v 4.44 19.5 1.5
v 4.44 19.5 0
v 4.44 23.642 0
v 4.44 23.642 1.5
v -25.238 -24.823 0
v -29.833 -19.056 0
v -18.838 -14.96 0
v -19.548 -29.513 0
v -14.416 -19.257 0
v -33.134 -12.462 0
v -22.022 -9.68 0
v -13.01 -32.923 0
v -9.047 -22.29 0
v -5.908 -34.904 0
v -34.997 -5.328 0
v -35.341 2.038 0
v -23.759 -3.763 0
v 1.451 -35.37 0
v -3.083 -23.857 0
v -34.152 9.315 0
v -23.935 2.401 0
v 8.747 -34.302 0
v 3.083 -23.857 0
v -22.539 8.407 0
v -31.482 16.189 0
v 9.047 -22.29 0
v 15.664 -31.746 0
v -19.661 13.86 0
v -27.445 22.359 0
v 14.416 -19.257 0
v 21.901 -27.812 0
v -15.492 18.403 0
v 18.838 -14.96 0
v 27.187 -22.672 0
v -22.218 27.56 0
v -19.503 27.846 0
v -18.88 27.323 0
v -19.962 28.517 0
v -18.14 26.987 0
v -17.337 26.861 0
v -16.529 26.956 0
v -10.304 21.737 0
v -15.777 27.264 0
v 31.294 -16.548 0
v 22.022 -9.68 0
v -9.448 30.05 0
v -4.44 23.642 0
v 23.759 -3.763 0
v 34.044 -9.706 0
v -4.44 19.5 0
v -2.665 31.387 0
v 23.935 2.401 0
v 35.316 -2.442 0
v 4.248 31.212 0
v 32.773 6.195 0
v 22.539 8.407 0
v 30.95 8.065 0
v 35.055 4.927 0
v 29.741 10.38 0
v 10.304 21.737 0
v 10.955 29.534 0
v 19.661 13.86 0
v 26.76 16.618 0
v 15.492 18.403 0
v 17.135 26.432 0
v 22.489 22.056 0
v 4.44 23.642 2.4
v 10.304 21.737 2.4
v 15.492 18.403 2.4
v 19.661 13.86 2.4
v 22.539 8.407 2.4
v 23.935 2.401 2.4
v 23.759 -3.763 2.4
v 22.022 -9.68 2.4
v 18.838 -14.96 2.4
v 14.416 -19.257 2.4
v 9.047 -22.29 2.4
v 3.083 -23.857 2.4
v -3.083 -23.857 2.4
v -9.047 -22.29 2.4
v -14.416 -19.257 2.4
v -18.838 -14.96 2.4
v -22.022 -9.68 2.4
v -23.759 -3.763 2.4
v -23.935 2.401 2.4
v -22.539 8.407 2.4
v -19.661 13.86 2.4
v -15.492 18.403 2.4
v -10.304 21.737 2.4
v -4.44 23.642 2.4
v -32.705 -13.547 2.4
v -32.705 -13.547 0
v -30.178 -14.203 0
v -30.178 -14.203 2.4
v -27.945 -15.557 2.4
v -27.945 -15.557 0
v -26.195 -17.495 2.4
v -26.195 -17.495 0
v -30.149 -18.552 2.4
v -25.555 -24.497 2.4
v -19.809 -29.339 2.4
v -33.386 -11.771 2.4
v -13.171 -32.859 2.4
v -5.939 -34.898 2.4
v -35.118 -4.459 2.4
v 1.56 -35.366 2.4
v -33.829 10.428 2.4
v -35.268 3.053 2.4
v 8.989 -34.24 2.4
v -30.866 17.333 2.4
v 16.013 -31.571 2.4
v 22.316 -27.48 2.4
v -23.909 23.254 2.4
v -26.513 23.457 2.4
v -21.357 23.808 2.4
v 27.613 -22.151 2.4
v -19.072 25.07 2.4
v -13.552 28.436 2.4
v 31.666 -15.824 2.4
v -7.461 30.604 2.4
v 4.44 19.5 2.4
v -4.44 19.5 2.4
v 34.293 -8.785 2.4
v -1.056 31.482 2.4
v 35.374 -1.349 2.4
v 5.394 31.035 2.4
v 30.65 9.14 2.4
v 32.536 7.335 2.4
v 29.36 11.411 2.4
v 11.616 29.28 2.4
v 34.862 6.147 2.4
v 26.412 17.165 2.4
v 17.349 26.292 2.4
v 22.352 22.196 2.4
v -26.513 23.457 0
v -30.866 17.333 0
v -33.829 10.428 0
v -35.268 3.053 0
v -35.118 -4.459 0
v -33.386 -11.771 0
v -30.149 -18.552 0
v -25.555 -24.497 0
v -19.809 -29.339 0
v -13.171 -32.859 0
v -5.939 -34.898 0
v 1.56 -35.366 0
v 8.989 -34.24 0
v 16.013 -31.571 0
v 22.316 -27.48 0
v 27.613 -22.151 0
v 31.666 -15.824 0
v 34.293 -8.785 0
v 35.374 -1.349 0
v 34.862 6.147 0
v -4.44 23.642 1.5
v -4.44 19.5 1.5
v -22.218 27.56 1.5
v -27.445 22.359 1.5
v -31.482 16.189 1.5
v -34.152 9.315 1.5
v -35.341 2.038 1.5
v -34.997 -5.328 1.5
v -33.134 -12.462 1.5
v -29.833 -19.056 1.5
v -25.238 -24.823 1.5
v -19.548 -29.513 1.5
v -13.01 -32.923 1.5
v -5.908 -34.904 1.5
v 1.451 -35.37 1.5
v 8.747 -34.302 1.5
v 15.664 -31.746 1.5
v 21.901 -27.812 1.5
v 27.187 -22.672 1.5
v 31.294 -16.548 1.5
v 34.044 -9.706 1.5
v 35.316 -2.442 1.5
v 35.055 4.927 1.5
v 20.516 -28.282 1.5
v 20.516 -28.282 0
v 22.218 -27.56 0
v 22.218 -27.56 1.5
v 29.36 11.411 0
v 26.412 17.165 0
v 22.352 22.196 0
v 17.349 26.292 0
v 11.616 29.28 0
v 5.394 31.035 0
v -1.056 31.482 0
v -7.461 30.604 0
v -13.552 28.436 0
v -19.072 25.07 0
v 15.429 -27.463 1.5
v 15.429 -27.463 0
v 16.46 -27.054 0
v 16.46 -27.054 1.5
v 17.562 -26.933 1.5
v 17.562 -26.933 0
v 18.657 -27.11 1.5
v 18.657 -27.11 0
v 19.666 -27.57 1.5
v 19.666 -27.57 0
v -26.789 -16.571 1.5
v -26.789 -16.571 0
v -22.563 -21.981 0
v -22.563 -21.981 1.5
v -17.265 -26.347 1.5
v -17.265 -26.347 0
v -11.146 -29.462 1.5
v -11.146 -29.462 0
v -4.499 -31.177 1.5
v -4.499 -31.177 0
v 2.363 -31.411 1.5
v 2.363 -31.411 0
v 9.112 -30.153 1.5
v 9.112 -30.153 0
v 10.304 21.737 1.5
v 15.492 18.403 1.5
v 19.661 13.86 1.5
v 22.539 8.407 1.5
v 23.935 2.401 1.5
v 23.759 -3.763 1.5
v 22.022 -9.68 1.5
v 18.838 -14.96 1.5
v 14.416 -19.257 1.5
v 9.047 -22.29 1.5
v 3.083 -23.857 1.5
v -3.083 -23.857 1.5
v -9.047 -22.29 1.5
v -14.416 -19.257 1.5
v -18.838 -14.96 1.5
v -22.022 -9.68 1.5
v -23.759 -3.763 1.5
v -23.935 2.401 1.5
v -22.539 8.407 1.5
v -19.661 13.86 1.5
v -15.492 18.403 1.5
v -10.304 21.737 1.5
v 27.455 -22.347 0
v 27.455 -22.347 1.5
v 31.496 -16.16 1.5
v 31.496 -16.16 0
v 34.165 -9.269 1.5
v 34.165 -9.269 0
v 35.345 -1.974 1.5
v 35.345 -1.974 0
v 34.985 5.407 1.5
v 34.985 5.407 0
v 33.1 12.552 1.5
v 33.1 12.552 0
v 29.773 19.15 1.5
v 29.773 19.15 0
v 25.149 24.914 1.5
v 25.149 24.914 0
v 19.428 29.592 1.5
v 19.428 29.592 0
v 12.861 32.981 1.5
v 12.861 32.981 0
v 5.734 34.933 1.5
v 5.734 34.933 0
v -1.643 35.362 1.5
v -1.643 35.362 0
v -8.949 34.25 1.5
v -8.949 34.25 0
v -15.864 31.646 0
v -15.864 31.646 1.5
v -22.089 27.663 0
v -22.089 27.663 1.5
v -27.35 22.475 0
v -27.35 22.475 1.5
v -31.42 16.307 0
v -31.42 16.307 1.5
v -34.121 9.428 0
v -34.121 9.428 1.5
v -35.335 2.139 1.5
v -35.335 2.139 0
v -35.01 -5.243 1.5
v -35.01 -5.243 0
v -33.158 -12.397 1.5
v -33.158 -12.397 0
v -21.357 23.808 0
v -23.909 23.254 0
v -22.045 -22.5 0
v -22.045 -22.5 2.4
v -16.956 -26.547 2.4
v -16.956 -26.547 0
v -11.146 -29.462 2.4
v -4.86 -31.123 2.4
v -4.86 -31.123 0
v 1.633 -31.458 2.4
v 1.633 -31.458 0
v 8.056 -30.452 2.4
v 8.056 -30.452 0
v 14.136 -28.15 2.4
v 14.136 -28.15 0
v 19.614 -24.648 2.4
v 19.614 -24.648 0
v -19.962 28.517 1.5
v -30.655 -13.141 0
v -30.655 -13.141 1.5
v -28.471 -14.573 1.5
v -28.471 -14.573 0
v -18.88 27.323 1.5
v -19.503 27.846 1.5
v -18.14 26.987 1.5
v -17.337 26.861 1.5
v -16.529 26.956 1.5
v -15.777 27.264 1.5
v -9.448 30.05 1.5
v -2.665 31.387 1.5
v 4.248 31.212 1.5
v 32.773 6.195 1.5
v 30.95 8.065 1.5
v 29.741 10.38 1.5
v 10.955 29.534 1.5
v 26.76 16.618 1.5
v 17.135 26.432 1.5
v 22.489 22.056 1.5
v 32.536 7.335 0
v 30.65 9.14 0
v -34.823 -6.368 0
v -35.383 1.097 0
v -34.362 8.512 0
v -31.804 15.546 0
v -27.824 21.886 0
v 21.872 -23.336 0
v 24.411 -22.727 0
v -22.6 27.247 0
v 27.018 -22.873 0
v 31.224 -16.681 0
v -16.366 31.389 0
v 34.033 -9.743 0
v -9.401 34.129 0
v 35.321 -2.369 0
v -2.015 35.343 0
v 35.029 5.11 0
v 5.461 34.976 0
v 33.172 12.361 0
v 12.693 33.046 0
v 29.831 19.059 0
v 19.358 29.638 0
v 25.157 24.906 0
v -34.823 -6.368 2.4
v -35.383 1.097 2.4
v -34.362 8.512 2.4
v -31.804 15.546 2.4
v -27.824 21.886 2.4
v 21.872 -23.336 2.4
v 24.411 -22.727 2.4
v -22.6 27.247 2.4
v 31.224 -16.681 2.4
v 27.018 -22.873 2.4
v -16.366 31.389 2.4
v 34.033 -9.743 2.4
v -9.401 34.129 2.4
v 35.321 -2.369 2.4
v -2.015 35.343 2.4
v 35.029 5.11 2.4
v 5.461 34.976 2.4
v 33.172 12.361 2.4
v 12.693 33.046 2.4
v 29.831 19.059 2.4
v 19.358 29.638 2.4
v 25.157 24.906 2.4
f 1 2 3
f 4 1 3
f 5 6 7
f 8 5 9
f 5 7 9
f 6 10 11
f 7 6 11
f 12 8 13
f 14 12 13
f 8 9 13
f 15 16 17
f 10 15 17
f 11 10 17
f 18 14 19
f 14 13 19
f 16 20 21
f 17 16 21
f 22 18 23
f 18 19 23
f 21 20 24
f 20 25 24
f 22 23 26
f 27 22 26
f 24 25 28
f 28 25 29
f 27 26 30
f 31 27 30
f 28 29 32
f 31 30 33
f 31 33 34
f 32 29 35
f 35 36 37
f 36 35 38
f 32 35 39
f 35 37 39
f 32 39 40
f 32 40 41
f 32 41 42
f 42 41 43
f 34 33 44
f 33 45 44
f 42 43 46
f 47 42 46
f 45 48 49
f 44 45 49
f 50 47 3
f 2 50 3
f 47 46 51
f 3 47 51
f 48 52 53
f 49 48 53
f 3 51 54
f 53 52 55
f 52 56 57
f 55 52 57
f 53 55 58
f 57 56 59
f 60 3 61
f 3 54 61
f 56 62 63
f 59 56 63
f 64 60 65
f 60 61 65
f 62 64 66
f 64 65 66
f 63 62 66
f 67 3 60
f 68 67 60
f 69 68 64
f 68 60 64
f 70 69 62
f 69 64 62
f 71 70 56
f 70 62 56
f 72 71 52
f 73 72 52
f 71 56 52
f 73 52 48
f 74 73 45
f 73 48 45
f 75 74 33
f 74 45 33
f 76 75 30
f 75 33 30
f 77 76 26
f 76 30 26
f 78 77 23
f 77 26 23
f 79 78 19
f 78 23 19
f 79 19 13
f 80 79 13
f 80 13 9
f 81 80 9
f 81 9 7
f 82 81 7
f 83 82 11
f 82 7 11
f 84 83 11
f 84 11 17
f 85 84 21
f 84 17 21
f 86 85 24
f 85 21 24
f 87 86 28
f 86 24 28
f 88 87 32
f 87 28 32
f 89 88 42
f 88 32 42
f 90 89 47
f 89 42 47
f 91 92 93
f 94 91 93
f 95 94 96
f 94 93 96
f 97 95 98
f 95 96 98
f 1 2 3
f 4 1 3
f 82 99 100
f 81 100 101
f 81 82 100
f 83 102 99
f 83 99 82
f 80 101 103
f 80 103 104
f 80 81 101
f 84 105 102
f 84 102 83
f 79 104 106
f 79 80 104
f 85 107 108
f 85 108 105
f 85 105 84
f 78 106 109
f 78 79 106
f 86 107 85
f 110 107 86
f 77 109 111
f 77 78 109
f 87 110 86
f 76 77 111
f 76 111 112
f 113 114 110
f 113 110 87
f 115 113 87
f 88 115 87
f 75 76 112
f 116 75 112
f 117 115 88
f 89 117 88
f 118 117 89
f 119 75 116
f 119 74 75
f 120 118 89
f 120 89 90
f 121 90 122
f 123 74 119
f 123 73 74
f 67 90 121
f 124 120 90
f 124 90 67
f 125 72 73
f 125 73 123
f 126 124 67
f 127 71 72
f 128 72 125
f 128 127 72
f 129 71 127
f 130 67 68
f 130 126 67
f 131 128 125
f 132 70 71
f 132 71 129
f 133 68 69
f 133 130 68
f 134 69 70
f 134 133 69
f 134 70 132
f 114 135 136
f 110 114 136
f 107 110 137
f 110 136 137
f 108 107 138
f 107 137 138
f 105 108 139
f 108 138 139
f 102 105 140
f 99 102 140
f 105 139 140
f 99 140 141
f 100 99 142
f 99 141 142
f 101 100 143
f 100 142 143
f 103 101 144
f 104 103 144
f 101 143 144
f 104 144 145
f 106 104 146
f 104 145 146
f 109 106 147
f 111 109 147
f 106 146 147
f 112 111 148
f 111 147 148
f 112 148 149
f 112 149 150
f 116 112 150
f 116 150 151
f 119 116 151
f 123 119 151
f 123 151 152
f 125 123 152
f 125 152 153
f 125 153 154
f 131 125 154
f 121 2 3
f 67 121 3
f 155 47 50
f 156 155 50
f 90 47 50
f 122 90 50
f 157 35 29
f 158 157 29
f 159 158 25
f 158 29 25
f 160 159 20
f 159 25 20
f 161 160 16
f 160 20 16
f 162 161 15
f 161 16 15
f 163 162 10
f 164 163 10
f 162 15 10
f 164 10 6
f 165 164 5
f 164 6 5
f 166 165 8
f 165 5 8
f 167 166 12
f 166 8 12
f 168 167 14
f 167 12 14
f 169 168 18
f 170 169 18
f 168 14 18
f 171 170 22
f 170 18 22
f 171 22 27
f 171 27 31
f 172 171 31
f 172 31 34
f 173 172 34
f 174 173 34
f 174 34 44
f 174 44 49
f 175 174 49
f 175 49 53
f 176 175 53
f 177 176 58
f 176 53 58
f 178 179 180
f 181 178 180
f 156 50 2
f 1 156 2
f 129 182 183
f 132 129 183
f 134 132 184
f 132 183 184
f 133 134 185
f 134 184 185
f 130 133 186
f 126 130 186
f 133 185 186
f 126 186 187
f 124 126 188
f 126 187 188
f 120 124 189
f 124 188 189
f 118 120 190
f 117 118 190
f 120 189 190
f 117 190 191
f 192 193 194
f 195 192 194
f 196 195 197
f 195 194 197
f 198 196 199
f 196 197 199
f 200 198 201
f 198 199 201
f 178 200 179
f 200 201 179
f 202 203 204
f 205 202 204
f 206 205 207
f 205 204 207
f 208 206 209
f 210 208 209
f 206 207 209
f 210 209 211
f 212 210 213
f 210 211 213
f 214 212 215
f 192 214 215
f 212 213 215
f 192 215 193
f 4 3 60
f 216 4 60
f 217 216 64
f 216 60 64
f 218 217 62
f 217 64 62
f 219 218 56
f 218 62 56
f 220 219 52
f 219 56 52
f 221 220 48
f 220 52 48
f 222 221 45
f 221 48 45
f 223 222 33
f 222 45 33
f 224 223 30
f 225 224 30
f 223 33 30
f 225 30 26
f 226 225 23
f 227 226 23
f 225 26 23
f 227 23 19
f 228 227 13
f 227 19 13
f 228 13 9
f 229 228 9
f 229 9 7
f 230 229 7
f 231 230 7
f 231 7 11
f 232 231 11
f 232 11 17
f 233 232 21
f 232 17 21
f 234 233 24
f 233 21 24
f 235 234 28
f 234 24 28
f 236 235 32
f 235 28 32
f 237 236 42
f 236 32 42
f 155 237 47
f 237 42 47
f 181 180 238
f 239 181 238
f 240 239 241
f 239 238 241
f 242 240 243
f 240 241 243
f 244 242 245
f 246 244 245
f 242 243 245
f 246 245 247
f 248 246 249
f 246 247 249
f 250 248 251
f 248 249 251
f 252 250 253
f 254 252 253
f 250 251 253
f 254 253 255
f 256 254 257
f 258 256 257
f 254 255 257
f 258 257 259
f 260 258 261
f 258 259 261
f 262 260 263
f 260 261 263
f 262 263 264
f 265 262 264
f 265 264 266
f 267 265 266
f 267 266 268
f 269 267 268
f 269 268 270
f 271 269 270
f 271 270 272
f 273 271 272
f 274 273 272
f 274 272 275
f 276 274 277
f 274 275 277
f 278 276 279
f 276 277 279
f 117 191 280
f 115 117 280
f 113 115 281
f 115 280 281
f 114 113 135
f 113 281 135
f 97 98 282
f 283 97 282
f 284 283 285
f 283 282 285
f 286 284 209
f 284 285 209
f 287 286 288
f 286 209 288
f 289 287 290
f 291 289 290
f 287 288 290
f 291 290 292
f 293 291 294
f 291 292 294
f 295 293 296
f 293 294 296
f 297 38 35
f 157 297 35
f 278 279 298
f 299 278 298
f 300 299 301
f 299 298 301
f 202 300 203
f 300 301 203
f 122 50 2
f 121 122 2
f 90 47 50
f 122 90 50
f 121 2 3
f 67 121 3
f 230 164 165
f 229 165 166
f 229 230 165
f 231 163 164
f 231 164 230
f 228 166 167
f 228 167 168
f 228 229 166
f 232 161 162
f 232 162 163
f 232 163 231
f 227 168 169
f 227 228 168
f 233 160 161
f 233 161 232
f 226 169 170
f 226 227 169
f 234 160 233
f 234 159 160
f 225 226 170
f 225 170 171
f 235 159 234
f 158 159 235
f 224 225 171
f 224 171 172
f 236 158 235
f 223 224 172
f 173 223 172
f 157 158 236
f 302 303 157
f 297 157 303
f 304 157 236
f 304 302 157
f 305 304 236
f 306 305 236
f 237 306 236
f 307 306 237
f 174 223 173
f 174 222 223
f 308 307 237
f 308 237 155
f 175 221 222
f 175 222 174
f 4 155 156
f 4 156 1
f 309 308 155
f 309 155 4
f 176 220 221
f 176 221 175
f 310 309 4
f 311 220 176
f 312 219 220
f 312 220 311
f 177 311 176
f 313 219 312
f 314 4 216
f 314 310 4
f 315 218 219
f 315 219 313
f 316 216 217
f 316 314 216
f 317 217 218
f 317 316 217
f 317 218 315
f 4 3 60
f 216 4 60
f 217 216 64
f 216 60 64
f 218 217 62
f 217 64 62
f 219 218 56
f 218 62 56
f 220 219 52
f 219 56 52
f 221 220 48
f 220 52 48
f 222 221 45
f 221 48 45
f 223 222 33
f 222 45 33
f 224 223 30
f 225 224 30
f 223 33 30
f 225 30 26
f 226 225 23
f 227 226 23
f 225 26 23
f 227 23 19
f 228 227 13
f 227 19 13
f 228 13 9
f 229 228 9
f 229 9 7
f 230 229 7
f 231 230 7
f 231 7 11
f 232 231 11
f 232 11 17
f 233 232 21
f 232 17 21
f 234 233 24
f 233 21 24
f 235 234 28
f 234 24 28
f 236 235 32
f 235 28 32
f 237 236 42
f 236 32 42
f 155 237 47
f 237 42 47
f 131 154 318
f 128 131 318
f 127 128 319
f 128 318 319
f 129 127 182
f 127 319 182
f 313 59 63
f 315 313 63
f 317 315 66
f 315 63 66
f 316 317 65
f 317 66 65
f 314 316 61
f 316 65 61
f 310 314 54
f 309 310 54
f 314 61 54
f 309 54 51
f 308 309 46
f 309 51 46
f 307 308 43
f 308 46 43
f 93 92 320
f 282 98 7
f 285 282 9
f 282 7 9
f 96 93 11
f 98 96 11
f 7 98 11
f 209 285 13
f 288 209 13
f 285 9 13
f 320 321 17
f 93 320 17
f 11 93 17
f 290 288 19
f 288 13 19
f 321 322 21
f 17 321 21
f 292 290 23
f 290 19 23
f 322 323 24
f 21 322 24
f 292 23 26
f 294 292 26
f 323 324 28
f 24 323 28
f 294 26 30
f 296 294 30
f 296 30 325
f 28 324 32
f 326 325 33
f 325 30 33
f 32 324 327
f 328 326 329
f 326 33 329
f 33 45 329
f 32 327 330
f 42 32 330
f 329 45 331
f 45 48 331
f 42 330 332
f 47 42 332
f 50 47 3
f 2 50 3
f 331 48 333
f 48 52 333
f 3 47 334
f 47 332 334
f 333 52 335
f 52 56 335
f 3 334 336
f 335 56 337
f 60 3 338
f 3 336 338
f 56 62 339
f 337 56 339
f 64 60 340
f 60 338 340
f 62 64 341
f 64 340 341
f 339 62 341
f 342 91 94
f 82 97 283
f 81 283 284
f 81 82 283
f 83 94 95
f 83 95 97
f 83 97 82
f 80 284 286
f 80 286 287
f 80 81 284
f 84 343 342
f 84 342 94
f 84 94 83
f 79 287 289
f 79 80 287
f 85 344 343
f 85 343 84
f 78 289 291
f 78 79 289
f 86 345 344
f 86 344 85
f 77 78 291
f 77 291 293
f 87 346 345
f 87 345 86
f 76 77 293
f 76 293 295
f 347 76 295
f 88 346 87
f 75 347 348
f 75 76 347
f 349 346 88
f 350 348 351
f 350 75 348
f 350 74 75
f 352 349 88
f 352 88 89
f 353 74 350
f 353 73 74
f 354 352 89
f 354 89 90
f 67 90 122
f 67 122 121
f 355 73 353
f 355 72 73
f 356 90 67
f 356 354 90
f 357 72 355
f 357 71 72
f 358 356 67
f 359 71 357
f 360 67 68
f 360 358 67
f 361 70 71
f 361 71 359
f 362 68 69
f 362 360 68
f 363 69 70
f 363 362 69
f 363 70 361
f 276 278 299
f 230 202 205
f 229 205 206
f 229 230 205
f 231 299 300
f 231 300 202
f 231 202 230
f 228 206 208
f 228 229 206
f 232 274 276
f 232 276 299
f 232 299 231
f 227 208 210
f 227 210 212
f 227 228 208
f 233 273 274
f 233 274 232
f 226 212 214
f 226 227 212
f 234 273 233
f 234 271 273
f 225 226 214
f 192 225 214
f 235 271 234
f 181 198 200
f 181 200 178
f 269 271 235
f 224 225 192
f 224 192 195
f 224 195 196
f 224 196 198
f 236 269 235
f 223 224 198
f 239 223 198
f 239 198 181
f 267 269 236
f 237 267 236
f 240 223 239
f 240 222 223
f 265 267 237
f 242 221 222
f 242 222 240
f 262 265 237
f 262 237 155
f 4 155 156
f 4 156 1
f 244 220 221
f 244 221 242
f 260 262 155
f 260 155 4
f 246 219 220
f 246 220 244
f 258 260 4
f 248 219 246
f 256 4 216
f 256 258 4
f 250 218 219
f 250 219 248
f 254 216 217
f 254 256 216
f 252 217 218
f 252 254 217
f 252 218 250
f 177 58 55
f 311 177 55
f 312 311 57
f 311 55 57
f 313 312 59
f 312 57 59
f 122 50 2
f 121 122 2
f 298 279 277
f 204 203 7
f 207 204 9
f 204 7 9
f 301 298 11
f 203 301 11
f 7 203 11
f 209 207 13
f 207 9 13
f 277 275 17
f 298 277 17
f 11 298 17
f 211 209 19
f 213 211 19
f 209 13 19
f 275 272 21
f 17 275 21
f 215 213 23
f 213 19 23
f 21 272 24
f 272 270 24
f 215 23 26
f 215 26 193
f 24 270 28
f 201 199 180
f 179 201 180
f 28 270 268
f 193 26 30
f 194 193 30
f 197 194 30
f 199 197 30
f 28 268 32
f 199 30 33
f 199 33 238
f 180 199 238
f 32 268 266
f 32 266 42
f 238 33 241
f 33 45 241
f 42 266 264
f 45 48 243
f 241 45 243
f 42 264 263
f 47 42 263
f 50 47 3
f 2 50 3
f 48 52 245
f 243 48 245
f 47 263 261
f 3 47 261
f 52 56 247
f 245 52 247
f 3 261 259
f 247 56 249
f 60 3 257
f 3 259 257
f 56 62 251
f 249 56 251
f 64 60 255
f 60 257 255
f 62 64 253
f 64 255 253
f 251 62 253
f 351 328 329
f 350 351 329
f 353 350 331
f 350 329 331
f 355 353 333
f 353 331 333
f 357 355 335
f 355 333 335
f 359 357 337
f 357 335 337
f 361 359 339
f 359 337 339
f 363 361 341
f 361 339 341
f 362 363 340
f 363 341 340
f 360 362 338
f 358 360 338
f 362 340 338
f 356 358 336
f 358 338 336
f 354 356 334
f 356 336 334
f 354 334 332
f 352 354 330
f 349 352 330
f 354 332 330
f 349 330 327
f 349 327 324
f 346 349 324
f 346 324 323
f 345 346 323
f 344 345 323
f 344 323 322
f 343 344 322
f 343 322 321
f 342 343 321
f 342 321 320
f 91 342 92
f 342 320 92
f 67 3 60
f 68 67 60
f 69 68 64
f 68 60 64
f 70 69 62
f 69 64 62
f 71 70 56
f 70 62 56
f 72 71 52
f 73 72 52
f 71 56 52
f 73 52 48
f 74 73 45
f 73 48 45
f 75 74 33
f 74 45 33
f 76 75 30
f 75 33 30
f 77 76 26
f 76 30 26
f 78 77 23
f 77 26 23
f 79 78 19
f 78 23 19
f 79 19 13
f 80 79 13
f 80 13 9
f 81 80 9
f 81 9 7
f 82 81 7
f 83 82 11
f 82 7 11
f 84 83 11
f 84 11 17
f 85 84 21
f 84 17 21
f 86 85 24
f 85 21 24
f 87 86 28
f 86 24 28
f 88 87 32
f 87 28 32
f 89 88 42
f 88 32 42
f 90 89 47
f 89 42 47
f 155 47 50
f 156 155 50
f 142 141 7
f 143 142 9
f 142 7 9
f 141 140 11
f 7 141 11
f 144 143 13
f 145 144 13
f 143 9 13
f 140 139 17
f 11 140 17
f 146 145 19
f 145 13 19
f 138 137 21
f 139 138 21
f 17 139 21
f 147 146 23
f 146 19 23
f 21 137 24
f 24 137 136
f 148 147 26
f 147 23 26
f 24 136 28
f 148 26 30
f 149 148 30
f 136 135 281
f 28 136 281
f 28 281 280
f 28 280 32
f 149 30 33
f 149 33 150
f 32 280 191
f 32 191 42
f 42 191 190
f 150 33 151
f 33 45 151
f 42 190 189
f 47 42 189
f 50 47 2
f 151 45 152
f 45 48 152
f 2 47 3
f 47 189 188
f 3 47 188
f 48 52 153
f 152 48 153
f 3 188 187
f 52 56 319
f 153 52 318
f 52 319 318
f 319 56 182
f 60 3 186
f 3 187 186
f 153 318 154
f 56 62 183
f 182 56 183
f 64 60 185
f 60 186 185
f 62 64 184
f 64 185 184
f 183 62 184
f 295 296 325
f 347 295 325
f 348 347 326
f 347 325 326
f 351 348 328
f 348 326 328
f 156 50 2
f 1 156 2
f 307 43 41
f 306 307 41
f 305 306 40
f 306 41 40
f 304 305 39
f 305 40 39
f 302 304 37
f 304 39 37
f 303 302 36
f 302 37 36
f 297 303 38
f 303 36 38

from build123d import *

# Parameters (mm, degrees)
F1_DEPTH = 0.5
F3_DEPTH = 0.8
F5_DEPTH = 0.5
F7_DEPTH = 0.8
F8_SCALE = 3


with BuildPart() as f1:
    # F0 (on Top) → F1 (new body)
    with BuildSketch(Plane.XY):
        with BuildLine():
            Line((6.8387676217, -9.4273056542), (7.4058337822, -9.18660035))
            ThreePointArc((7.4058337822, -9.18660035), (3.1162609999, 11.3810771626), (-11.0527318331, -4.1324470989))
            ThreePointArc((-11.0527318331, -4.1324470989), (-9.8368762603, -4.5924206502), (-8.9297485056, -5.5235488253))
            ThreePointArc((-8.9297485056, -5.5235488253), (-2.6230960634, -10.167072688), (5.1428823598, -9.1542755603))
            ThreePointArc((5.1428823598, -9.1542755603), (6.0384623822, -8.9948981328), (6.8387676217, -9.4273056542))
        make_face()
        with BuildLine():
            ThreePointArc((1.48, 7.8807323422), (0, -8.0185), (-1.48, 7.8807323422))
            Line((-1.48, 7.8807323422), (-1.48, 6.5))
            Line((-1.48, 6.5), (1.48, 6.5))
            Line((1.48, 6.5), (1.48, 7.8807323422))
        make_face(mode=Mode.SUBTRACT)
    extrude(amount=F1_DEPTH)


with BuildPart() as f3:
    # F2 (on Top) → F3 (new body)
    with BuildSketch(Plane.XY):
        with BuildLine():
            ThreePointArc((6.537965625, -8.2161429811), (7.7063762874, -7.6463211092), (9.0061431434, -7.6242629598))
            ThreePointArc((9.0061431434, -7.6242629598), (1.8204956547, 11.658721867), (-10.9017784836, -4.5156645019))
            ThreePointArc((-10.9017784836, -4.5156645019), (-9.6706107317, -4.9329251022), (-8.7315396701, -5.8318277572))
            ThreePointArc((-8.7315396701, -5.8318277572), (-1.6199325741, -10.374286407), (6.537965625, -8.2161429811))
        make_face()
        with BuildLine():
            ThreePointArc((1.48, 7.8807323422), (0, -8.0185), (-1.48, 7.8807323422))
            Line((-1.48, 7.8807323422), (-1.48, 6.5))
            Line((-1.48, 6.5), (1.48, 6.5))
            Line((1.48, 6.5), (1.48, 7.8807323422))
        make_face(mode=Mode.SUBTRACT)
    extrude(amount=F3_DEPTH)


with BuildPart() as f5:
    # F4 (on Top) → F5 (new body)
    with BuildSketch(Plane.XY):
        with BuildLine():
            Line((-6.6539702746, 9.5057474742), (-7.4058337822, 9.18660035))
            ThreePointArc((-7.4058337822, 9.18660035), (-4.3367613017, -10.974174293), (11.6851632112, 1.6422425913))
            ThreePointArc((11.6851632112, 1.6422425913), (10.597684768, 2.3544722436), (9.913592586, 3.4598673442))
            ThreePointArc((9.913592586, 3.4598673442), (3.6517736611, 9.8445187352), (-5.2590021182, 9.0880634197))
            ThreePointArc((-5.2590021182, 9.0880634197), (-6.046699252, 8.995614702), (-6.6539702746, 9.5057474742))
        make_face()
        with BuildLine():
            ThreePointArc((1.48, 7.8807323422), (0, -8.0185), (-1.48, 7.8807323422))
            Line((-1.48, 7.8807323422), (-1.48, 6.5))
            Line((-1.48, 6.5), (1.48, 6.5))
            Line((1.48, 6.5), (1.48, 7.8807323422))
        make_face(mode=Mode.SUBTRACT)
    extrude(amount=F5_DEPTH)


with BuildPart() as f7:
    # F6 (on Top) → F7 (new body)
    with BuildSketch(Plane.XY):
        with BuildLine():
            ThreePointArc((-6.3571755517, 8.3568127301), (-7.5377387626, 7.8126152046), (-8.8376775053, 7.8189165689))
            ThreePointArc((-8.8376775053, 7.8189165689), (-3.2029973084, -11.3569717902), (11.6207314855, 2.0490484965))
            ThreePointArc((11.6207314855, 2.0490484965), (10.5090590485, 2.7228918274), (9.7868058643, 3.8037390783))
            ThreePointArc((9.7868058643, 3.8037390783), (2.8501247236, 10.1057799828), (-6.3571755517, 8.3568127301))
        make_face()
        with BuildLine():
            ThreePointArc((1.48, 7.8807323422), (0, -8.0185), (-1.48, 7.8807323422))
            Line((-1.48, 7.8807323422), (-1.48, 6.5))
            Line((-1.48, 6.5), (1.48, 6.5))
            Line((1.48, 6.5), (1.48, 7.8807323422))
        make_face(mode=Mode.SUBTRACT)
    extrude(amount=F7_DEPTH)


with BuildPart() as f1_1:
    # F8: moved
    add(f1.part.scale(F8_SCALE))


with BuildPart() as f3_1:
    # F8: moved
    add(f3.part.scale(F8_SCALE))


with BuildPart() as f5_1:
    # F8: moved
    add(f5.part.scale(F8_SCALE))


with BuildPart() as f7_1:
    # F8: moved
    add(f7.part.scale(F8_SCALE))


solid = Compound([f1_1.part, f3_1.part, f5_1.part, f7_1.part])
